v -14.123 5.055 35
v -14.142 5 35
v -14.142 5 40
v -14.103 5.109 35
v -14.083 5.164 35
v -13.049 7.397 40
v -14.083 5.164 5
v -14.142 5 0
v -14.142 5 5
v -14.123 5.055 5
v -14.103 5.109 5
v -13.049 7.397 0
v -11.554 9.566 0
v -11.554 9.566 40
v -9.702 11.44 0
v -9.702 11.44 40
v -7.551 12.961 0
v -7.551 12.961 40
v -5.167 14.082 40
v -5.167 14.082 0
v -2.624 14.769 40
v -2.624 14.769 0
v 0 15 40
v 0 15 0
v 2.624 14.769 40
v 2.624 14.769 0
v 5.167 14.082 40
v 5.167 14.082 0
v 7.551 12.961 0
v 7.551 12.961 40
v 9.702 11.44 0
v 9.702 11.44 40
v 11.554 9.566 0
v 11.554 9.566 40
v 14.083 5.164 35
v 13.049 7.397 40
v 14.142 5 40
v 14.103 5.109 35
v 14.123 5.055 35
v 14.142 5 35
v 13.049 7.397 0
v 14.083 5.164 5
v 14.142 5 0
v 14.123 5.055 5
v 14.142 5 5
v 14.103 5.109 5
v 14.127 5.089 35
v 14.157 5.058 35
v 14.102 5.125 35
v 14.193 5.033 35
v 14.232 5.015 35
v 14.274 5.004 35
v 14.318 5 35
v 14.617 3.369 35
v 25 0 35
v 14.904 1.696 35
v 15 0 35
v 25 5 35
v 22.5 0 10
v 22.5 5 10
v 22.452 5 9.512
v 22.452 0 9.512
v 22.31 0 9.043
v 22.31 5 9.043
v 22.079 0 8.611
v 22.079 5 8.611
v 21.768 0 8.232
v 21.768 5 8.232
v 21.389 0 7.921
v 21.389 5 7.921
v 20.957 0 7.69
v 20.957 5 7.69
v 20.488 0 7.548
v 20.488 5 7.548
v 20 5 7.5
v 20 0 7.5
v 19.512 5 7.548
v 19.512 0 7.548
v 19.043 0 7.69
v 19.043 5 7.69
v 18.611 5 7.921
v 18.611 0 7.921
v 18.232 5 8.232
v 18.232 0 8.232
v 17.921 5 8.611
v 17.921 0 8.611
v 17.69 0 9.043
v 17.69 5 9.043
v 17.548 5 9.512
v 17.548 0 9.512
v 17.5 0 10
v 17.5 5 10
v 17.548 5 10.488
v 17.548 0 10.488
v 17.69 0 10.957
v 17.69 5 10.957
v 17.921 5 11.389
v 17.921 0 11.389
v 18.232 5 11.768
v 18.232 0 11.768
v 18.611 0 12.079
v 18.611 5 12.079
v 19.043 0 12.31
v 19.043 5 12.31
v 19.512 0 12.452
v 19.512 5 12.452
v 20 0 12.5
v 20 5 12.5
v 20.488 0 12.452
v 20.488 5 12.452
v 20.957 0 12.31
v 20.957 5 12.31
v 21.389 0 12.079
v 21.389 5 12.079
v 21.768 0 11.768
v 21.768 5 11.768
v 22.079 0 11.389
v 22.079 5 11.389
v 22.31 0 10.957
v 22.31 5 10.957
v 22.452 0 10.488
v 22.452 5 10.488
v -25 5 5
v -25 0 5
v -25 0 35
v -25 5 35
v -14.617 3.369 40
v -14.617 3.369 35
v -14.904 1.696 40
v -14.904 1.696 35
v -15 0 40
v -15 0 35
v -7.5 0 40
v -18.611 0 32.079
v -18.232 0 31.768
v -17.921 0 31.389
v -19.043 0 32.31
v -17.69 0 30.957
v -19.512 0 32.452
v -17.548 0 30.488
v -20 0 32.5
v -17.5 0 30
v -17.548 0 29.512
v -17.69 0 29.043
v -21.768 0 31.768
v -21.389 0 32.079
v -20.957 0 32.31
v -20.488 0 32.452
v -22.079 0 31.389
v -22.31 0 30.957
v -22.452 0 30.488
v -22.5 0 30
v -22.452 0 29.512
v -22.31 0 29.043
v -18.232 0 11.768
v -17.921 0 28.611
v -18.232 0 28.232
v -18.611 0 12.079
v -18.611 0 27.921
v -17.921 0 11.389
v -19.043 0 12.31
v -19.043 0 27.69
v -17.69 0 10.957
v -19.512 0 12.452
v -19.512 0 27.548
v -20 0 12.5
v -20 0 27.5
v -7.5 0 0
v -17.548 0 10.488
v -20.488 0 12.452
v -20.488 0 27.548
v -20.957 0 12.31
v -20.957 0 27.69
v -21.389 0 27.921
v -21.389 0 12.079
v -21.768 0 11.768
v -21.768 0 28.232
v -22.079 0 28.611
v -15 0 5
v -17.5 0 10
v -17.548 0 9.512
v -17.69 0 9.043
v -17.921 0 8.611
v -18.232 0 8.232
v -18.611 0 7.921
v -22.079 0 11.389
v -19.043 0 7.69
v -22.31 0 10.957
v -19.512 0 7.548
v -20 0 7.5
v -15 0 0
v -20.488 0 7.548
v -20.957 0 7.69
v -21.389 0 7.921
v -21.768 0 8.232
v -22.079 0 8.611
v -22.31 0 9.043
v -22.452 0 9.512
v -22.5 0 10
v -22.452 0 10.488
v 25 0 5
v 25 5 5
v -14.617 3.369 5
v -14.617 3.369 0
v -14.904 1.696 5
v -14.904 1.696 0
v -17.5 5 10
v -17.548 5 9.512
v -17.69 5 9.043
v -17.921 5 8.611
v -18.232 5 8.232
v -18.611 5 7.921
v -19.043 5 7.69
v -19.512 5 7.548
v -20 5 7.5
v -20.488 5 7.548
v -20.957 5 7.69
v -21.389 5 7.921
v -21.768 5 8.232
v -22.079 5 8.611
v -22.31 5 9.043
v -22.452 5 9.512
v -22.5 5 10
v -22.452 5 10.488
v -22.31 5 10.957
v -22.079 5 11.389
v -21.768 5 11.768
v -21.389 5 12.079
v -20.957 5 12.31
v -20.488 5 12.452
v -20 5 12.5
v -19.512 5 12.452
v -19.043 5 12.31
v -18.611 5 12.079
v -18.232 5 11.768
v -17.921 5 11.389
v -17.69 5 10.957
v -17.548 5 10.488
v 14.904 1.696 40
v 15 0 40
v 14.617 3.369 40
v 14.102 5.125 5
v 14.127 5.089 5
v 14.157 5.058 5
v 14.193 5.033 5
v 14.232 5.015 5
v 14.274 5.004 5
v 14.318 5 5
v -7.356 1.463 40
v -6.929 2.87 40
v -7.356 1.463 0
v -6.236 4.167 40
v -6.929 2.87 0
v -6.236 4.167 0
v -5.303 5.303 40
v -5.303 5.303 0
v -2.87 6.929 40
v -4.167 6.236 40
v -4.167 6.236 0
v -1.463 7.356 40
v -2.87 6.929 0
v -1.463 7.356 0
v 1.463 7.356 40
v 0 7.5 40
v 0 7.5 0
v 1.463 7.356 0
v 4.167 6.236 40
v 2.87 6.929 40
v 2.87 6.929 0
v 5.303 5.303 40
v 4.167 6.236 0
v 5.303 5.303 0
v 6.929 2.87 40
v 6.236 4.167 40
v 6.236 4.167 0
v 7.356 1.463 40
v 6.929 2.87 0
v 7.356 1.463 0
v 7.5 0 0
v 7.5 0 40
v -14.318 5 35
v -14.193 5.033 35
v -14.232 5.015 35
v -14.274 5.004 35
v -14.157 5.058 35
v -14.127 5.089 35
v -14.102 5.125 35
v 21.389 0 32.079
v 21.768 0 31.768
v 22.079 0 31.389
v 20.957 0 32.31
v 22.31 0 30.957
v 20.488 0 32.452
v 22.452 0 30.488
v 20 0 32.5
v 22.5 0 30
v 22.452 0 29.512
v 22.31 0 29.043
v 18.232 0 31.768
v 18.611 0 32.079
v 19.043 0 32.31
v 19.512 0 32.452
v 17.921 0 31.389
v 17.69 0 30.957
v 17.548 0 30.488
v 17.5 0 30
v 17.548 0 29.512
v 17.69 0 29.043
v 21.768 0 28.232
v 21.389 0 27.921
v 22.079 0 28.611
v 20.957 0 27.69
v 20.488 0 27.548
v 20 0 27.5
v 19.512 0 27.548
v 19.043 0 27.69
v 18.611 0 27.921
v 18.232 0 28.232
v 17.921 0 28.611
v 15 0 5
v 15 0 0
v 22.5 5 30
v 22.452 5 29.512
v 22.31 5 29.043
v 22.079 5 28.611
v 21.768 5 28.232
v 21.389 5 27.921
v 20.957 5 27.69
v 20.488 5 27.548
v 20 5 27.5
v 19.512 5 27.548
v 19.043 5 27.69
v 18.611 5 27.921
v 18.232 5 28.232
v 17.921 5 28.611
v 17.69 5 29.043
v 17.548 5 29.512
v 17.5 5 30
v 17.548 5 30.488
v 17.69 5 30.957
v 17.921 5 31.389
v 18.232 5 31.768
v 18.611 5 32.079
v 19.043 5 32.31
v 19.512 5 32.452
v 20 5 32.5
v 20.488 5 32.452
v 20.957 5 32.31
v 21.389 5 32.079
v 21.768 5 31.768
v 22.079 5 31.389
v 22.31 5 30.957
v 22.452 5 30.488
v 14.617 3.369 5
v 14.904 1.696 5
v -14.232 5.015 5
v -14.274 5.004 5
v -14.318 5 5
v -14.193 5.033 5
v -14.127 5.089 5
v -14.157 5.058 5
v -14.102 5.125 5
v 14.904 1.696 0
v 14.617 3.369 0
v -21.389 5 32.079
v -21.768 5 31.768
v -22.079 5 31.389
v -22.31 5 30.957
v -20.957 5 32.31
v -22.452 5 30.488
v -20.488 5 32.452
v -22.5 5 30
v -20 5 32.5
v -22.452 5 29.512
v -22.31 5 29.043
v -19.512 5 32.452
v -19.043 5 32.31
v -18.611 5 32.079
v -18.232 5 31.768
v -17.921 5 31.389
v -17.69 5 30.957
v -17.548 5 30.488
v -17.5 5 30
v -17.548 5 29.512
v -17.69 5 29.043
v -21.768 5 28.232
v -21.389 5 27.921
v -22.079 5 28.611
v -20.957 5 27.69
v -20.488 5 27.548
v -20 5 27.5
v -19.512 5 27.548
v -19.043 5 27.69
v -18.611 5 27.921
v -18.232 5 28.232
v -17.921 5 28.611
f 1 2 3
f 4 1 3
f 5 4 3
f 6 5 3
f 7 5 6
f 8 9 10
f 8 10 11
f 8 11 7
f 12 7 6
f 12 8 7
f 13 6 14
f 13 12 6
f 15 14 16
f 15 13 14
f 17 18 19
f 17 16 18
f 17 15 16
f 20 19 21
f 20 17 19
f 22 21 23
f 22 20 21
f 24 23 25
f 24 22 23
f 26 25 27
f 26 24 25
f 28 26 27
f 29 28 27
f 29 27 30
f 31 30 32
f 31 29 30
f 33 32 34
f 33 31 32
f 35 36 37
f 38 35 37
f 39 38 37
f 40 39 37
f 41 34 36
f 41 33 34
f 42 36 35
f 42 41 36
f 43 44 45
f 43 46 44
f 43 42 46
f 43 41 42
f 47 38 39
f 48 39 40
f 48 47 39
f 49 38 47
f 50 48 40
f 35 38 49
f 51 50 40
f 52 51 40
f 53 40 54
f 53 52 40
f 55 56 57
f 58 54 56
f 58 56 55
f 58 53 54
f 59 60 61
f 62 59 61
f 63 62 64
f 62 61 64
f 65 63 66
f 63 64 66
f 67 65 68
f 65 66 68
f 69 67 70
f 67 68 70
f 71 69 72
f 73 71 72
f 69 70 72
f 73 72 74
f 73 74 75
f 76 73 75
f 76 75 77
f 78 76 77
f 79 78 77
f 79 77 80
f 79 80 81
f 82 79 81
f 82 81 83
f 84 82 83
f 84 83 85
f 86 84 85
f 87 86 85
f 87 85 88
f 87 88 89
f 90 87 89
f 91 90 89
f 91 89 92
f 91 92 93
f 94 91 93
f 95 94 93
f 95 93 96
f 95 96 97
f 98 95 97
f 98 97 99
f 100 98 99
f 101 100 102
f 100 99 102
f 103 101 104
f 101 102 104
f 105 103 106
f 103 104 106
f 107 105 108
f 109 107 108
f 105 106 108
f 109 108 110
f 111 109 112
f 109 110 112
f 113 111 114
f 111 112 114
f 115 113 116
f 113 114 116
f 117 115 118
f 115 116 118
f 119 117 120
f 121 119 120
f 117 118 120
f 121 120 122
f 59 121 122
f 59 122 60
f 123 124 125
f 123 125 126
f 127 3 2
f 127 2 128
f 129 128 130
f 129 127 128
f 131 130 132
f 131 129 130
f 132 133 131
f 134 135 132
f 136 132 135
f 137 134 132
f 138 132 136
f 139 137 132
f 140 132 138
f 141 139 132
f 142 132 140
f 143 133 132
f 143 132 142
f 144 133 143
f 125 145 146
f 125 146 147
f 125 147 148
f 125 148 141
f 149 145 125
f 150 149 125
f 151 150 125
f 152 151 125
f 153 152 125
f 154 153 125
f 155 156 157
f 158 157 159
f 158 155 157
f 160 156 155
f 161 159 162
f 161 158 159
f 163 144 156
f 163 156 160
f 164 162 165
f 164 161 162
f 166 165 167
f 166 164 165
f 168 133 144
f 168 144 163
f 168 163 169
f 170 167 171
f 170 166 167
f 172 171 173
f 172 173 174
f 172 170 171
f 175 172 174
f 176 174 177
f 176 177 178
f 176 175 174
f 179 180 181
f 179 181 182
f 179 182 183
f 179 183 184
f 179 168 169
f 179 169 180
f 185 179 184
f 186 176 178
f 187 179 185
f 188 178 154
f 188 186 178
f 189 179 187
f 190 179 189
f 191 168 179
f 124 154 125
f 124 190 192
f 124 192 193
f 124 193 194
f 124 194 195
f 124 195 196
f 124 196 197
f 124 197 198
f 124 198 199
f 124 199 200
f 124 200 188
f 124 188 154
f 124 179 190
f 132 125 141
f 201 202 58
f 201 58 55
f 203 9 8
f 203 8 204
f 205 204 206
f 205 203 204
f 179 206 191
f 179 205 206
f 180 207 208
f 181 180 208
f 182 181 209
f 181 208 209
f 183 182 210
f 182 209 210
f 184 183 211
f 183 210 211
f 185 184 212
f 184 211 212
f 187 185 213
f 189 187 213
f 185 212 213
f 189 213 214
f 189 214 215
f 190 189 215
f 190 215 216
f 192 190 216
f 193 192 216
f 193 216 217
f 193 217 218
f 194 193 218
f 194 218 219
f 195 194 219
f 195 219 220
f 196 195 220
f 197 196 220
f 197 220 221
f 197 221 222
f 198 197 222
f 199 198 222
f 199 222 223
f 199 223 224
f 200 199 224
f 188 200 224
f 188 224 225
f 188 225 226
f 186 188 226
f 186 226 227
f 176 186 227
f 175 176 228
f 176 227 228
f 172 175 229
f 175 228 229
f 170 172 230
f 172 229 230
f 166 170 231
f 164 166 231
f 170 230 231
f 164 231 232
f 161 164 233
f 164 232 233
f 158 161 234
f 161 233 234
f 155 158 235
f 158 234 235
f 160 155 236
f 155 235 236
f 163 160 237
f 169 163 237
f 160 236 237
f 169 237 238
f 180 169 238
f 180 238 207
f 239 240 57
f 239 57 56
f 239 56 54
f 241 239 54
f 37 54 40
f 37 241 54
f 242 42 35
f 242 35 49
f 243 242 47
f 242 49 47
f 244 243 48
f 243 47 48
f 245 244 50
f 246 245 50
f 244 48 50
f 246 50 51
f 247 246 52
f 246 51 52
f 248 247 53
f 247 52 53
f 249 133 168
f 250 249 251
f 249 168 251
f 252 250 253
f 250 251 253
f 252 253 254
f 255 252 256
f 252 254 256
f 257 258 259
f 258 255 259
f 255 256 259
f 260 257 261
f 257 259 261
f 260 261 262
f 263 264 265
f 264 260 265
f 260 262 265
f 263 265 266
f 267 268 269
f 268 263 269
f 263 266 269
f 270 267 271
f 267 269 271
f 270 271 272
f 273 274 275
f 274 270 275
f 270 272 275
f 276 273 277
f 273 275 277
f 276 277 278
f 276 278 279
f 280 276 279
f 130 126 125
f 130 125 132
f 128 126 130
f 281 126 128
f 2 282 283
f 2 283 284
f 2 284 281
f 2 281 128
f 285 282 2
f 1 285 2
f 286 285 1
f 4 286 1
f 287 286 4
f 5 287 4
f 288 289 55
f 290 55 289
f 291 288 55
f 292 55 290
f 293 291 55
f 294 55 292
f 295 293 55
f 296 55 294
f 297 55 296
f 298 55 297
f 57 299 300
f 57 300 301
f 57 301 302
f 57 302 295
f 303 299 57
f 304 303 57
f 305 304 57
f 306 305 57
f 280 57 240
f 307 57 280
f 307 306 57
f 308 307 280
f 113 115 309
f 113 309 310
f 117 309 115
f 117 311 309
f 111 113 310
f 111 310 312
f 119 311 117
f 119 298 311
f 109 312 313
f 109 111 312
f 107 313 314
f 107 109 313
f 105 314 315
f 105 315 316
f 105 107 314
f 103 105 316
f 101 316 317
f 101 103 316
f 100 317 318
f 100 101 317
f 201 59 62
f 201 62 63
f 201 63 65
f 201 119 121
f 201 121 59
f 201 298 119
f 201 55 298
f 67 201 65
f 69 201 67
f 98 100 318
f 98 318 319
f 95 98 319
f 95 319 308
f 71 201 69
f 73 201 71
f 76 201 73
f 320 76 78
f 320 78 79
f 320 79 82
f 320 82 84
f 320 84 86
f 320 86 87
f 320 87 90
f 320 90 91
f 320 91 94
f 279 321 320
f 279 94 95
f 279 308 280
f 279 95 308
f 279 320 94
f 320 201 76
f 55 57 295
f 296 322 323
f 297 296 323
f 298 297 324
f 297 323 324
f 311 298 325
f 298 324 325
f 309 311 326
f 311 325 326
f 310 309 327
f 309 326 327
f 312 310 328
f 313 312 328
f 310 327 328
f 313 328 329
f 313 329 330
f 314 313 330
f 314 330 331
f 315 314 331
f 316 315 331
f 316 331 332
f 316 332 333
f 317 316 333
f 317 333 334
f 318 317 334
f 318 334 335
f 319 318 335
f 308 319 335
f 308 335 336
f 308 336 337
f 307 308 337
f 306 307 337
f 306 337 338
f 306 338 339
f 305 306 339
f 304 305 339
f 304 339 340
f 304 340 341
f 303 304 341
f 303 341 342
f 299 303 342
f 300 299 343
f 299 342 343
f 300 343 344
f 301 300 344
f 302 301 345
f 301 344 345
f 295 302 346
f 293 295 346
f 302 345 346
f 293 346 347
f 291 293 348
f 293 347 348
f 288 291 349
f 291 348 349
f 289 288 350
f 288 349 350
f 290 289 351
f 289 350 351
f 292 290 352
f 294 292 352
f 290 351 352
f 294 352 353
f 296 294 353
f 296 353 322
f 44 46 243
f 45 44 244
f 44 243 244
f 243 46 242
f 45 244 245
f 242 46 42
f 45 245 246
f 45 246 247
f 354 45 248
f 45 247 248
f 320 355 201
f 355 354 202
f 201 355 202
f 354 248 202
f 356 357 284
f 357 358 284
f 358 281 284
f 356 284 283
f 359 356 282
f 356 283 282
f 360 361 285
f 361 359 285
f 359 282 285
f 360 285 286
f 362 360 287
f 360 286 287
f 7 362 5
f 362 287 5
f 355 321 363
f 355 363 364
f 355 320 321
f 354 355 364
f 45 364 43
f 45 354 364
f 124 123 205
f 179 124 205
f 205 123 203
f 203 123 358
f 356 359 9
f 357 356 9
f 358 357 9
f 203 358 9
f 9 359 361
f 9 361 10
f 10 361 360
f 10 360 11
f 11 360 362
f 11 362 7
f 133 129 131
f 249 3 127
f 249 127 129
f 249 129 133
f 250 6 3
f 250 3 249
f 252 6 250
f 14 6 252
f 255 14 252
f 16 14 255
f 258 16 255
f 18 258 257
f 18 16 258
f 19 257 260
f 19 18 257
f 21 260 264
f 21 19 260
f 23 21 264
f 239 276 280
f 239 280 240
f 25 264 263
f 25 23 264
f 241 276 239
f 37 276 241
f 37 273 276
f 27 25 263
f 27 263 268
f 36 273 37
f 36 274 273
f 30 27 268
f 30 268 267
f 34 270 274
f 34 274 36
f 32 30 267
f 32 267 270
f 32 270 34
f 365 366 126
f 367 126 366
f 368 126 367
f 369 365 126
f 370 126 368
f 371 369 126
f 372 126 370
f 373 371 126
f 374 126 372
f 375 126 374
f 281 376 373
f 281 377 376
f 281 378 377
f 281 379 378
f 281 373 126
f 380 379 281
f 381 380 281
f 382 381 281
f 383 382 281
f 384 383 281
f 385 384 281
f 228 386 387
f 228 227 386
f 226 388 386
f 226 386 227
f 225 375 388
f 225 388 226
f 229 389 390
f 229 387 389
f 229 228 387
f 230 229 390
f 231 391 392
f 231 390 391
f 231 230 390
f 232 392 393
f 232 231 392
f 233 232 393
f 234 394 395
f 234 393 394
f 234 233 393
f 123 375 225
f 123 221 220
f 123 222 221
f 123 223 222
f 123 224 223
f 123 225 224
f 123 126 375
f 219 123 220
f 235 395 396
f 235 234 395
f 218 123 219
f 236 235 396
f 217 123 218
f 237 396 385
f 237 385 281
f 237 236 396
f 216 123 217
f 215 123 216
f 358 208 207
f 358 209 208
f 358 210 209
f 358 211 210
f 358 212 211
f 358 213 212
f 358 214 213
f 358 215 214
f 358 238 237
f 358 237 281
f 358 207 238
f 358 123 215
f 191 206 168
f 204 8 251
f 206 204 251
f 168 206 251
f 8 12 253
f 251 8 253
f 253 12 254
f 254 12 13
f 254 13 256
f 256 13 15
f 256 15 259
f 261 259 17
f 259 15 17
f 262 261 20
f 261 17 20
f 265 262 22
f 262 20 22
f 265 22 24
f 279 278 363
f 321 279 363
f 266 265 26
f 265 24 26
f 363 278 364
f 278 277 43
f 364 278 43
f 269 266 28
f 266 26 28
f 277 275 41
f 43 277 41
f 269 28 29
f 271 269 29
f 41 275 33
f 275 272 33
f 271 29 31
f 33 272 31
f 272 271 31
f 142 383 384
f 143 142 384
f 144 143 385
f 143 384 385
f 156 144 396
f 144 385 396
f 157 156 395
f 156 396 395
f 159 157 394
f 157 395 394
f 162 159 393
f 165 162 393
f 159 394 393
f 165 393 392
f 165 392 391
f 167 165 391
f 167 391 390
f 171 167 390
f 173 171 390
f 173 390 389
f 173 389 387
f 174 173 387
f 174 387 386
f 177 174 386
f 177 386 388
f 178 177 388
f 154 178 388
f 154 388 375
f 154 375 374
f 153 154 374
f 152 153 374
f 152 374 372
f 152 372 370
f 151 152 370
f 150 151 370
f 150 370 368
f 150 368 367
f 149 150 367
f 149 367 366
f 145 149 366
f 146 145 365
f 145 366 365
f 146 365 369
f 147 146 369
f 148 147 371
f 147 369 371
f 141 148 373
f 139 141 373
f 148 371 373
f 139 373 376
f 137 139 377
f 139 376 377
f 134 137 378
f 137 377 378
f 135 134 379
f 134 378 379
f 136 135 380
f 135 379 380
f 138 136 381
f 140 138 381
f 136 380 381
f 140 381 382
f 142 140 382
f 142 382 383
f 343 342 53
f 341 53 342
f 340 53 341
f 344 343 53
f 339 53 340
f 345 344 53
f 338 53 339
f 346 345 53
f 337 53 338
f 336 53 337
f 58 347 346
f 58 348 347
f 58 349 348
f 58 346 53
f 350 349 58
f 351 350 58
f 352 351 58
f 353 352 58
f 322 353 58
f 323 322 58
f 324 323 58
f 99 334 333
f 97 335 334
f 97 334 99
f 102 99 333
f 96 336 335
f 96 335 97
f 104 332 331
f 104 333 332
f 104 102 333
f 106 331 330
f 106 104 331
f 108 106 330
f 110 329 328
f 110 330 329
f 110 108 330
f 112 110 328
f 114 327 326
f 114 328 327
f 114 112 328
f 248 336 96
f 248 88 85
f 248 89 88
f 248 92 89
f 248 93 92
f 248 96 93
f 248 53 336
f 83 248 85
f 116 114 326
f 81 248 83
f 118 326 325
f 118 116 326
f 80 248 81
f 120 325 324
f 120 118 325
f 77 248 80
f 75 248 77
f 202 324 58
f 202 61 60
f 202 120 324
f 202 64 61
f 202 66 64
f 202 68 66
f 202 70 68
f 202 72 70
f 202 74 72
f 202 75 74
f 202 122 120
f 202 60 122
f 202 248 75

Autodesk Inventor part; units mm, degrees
ref_plane "YZ Plane" through (0, 0, 0) normal (1, 0, 0) x (0, 1, 0)
ref_plane "XZ Plane" through (0, 0, 0) normal (0, 1, 0) x (-1, 0, 0)
ref_plane "XY Plane" through (0, 0, 0) normal (0, 0, 1) x (1, 0, 0)
sketch "草图1" plane through (0, 0, 0) normal (0, 0, 1) x (1, 0, 0)
  arc A0 (7.5, 0) -> (-7.5, 0) centre (0, 0) ccw
  arc A1 (15, 0) -> (-15, 0) centre (0, 0) ccw
  line L0 (25, 5) -> (25, 0)
  line L1 (-25, 0) -> (-25, 5)
  line L2 (25, 0) -> (7.5, 0)
  line L3 (-7.5, 0) -> (-25, 0)
  line L4 (-25, 5) -> (-5.5902, 5)
  line L5 (5.5902, 5) -> (25, 5)
  line L6 (0, 0) -> (0, -4.0409)
  line L7 (0, 0) -> (2.0046, 0)
  arc A2 (5.5902, 5) -> (-5.5902, 5) centre (0, 0) ccw
  arc A3 (14.1421, 5) -> (-14.1421, 5) centre (0, 0) ccw
  dimension "d0" = 15
  dimension "d1" = 30
  dimension "d2" = 5
  dimension "d3" = 50
  dimension "d4" = 4.0409
  dimension "d5" = 2.0046
extrude "拉伸1" add sketch "草图1" along normal blind 40
sketch "草图2" plane through (0, 0, 40) normal (0, 0, 1) x (1, 0, 0)
  line L0 (14.1421, 5) -> (25, 5)
  line L1 (25, 5) -> (14.1421, 5) projected
  line L2 (25, 5) -> (25, 0)
  line L3 (25, 0) -> (15, 0)
  line L4 (7.5, 0) -> (25, 0) projected
  line L5 (-14.1421, 5) -> (-25, 5)
  line L6 (-14.1421, 5) -> (-25, 5) projected
  line L7 (-25, 5) -> (-25, 0)
  line L8 (-25, 0) -> (-15, 0)
  arc A0 (15, 0) -> (14.1421, 5) centre (0, 0) ccw
  arc A1 (-14.1421, 5) -> (-15, 0) centre (0, 0) ccw
extrude "拉伸2" cut sketch "草图2" against normal blind 5
pattern_linear "矩形阵列1" count 2 spacing 35 along (0, 0, -1) of "拉伸2"
fillet "圆角1" radius 0.25 2 edges at (14.1421, 5, 20) (-14.1421, 5, 20)
sketch "草图3" plane through (25, 5, 35) normal (0, 1, 0) x (1, 0, 0)
  circle A0 centre (-5, 25) radius 2.5
  circle A1 centre (-5, 5) radius 2.5
  circle A2 centre (-45, 25) radius 2.5
  circle A3 centre (-45, 5) radius 2.5
  line L0 (0, 30) -> (0, 0) projected
  line L1 (0, 30) -> (-10.6822, 30) projected
  line L2 (-10.6822, 0) -> (0, 0) projected
  line L3 (-50, 30) -> (-50, 0) projected
  line L4 (-50, 0) -> (-39.3178, 0) projected
  line L5 (-39.3178, 30) -> (-50, 30) projected
  point P0 (-25, 35)
  dimension "d14" = 5
  dimension "d15" = 5
  dimension "d16" = 5
  dimension "d17" = 5
  dimension "d18" = 5
  dimension "d19" = 5
  dimension "d20" = 5
  dimension "d21" = 5
  dimension "d22" = 5
  dimension "d23" = 5
  dimension "d24" = 5
  dimension "d25" = 5
extrude "拉伸3" cut sketch "草图3" against normal through all
properties part number "砂轮架带动曲柄轴盖"
